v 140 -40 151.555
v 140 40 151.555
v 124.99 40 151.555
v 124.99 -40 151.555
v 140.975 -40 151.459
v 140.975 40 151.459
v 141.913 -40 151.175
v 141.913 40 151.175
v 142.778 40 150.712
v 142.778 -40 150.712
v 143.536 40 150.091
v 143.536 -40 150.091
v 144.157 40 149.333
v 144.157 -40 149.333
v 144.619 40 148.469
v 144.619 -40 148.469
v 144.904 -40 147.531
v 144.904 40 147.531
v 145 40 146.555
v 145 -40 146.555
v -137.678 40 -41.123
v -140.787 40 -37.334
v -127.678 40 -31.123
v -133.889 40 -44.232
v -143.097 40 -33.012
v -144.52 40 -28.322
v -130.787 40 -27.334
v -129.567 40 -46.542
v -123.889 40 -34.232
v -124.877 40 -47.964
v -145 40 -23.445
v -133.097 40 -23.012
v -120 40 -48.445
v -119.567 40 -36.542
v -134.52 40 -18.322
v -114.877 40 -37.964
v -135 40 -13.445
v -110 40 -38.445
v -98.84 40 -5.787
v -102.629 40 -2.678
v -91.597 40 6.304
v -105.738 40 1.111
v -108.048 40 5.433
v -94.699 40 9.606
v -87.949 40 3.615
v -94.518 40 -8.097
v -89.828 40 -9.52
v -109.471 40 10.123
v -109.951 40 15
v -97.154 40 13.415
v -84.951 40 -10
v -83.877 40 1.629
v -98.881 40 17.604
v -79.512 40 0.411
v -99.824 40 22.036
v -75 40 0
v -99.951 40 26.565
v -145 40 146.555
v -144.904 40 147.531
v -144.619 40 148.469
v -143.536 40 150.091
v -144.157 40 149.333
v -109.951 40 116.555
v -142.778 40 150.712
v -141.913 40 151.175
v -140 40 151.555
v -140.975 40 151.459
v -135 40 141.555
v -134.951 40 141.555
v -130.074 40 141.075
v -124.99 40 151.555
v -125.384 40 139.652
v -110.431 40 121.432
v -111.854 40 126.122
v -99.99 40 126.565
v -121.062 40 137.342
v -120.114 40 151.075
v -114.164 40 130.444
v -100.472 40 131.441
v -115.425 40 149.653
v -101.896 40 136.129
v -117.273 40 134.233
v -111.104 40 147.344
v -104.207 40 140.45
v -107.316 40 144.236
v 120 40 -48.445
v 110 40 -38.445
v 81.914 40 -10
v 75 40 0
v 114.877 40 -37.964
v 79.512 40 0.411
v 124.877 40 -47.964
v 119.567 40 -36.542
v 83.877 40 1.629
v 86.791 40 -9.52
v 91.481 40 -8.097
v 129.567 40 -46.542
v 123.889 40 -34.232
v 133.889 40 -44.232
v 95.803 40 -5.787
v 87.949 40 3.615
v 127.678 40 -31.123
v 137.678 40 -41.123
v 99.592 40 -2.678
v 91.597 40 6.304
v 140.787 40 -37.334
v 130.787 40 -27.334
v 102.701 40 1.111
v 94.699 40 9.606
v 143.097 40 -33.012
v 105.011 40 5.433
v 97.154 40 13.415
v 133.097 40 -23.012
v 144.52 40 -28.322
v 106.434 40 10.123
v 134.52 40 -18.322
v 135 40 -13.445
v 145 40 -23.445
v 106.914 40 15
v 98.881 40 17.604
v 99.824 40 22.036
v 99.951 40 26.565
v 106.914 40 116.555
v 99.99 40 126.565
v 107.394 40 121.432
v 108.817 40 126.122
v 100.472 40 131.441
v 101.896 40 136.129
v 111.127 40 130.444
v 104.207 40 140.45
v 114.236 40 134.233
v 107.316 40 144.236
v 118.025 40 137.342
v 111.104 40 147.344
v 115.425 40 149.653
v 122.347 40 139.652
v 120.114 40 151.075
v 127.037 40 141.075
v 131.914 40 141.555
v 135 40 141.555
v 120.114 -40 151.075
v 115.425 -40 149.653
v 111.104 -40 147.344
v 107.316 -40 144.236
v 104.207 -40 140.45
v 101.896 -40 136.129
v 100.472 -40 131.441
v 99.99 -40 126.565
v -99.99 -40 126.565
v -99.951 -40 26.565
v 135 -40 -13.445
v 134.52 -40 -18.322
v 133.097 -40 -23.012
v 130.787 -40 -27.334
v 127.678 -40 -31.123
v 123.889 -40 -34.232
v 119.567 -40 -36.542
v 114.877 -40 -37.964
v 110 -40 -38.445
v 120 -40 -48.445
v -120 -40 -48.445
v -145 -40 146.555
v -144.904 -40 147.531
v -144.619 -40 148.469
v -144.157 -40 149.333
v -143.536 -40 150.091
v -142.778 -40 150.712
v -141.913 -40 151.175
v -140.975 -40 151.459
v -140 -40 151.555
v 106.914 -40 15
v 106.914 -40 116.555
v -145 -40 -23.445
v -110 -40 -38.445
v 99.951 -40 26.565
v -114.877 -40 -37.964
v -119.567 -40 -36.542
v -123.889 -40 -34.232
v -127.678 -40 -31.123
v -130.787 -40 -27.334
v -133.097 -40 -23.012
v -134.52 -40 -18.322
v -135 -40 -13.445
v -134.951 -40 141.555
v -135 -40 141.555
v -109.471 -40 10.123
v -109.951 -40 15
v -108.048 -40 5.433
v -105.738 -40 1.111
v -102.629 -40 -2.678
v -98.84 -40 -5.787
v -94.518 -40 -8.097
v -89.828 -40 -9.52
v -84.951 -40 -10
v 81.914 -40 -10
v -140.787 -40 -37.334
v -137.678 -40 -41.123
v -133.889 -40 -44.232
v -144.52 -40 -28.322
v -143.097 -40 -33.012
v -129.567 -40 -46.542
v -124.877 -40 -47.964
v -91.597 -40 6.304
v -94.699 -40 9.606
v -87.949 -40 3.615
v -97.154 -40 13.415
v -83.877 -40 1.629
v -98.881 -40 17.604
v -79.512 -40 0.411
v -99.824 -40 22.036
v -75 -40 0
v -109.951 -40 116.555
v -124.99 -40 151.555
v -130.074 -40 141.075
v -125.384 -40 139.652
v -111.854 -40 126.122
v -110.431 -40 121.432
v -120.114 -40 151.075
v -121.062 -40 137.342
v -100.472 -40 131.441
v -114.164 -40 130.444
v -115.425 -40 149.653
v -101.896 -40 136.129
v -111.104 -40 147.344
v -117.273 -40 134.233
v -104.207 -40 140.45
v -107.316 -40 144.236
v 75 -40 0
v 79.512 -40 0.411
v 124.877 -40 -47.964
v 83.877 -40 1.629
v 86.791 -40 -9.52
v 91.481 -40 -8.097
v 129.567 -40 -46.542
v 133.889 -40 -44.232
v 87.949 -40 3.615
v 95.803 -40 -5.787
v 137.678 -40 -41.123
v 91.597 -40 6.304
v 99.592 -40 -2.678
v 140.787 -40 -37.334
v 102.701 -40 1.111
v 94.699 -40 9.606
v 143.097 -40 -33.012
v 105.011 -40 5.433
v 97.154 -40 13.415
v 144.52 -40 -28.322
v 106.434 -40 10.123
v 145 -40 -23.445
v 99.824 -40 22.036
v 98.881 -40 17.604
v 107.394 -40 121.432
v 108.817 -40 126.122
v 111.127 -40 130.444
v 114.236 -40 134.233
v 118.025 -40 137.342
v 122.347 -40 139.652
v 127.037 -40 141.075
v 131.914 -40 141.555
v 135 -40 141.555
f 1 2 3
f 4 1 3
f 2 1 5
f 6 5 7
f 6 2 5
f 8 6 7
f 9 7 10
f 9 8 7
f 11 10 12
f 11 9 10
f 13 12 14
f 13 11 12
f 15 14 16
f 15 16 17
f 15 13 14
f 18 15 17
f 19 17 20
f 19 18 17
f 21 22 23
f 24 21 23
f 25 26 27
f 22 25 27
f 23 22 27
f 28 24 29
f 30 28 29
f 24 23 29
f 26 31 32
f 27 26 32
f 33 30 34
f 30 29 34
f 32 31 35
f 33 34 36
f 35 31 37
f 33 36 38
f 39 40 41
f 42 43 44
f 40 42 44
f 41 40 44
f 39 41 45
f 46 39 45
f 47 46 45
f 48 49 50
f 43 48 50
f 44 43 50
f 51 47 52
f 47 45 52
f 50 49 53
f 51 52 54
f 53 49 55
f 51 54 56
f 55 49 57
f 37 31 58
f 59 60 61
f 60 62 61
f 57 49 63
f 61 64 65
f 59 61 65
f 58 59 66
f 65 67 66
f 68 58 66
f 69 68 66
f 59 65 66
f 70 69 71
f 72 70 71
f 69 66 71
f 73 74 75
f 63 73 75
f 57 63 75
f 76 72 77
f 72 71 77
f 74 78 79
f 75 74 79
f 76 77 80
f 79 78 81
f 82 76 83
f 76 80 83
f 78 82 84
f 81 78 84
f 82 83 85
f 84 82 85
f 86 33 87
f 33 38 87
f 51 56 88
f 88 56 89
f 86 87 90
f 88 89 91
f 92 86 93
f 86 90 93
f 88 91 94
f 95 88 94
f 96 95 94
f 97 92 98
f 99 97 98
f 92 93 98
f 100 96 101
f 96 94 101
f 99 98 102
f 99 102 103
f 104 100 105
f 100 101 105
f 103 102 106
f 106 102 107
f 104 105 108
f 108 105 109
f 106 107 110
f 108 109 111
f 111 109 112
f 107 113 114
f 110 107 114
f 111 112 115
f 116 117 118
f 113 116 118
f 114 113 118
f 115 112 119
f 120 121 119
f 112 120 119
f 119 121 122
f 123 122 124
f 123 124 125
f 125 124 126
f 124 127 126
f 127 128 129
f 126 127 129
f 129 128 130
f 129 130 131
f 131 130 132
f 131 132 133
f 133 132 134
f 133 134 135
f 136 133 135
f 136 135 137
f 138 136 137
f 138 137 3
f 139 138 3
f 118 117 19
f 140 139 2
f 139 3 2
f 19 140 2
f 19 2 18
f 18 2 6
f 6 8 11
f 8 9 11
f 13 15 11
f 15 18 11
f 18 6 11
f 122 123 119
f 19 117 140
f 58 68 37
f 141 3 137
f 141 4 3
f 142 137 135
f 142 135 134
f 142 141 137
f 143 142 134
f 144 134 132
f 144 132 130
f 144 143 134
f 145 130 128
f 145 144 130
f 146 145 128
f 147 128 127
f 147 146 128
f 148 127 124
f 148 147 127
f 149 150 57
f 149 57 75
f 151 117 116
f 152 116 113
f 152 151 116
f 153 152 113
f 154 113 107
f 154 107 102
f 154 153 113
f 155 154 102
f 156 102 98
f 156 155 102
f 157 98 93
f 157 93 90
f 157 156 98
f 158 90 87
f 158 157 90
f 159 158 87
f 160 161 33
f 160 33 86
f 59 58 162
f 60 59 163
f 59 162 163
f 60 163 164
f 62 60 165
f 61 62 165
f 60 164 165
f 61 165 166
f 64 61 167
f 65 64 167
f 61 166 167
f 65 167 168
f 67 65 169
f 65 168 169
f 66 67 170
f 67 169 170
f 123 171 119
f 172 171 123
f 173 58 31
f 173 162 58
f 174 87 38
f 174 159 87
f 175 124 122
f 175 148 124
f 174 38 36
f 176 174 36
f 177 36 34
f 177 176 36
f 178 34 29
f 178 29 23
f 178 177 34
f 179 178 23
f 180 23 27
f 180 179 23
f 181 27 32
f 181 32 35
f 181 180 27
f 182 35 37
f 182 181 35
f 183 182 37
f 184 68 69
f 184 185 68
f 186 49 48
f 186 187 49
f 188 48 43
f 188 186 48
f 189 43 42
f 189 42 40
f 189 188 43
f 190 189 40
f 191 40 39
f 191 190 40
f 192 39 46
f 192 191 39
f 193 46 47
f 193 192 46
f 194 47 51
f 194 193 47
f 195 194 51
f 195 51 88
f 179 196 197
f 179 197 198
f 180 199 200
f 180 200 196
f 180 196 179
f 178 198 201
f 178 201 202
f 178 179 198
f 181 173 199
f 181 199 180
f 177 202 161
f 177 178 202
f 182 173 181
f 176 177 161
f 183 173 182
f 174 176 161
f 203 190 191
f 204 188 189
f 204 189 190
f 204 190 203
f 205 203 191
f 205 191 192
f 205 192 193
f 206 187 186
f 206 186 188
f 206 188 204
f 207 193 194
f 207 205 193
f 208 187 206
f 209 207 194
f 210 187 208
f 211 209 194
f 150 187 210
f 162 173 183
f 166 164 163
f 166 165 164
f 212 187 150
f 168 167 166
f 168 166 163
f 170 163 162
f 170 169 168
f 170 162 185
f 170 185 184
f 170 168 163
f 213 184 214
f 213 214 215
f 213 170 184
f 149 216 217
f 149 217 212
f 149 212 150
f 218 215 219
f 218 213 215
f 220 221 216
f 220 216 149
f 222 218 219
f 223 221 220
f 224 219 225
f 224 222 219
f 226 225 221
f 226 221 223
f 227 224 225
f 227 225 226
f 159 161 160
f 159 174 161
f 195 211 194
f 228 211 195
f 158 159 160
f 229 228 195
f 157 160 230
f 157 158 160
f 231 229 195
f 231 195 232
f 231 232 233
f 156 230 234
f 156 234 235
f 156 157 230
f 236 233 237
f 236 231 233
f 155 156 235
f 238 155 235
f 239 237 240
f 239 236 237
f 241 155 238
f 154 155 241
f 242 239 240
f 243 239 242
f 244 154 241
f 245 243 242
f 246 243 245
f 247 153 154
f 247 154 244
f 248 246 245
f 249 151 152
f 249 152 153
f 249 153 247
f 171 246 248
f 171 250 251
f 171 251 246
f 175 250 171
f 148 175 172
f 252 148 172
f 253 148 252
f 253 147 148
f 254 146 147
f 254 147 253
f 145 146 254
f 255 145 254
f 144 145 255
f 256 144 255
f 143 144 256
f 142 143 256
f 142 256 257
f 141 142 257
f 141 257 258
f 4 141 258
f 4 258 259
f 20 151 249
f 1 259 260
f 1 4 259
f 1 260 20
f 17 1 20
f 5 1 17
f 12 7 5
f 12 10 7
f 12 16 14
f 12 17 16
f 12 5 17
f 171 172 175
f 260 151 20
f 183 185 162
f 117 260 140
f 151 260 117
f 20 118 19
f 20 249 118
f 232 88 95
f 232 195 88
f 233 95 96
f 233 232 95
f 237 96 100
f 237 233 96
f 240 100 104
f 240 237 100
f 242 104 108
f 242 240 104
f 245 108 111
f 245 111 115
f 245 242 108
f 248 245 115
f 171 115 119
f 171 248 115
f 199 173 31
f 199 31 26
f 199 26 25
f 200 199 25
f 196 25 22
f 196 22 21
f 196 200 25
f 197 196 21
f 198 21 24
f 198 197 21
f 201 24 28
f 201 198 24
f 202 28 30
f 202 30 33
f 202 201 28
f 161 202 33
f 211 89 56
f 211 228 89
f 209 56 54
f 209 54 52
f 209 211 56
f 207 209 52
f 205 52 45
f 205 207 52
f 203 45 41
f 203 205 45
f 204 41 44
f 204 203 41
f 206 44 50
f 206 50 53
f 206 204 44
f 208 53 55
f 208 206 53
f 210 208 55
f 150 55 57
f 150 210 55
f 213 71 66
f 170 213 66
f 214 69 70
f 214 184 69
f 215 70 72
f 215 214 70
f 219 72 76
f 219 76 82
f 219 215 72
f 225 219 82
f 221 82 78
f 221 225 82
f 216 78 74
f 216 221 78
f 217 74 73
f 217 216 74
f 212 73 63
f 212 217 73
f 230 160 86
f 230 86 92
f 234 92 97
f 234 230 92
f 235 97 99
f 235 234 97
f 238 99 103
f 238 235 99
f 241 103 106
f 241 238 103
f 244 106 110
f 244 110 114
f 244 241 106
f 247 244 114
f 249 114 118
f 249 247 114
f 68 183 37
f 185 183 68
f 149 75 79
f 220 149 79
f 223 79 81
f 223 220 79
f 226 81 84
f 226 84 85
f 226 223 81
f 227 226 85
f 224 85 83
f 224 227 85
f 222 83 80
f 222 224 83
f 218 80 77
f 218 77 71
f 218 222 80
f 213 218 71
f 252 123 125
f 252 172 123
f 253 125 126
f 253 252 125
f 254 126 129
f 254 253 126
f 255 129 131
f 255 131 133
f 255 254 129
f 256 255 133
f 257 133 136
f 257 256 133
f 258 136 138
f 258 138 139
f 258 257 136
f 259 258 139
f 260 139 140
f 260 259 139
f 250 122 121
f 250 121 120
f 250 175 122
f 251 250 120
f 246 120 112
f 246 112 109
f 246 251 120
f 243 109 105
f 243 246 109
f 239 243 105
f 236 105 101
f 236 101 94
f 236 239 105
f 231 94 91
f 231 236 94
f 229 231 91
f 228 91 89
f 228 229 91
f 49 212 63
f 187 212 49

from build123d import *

# Parameters (mm, degrees)
F1_DEPTH = 40
F2_R     = 5


with BuildPart() as f1:
    # F0 (on Front) → F1 (new body, symmetric)
    with BuildSketch(Plane.XZ):
        with BuildLine():
            Line((0, 0), (-75, 0))
            ThreePointArc((-75, 0), (-93.22257, 7.88457), (-99.95097, 26.564963))
            Line((-99.95097, 26.564963), (-99.990197, 126.564956))
            ThreePointArc((-99.990197, 126.564956), (-107.315993, 144.236285), (-124.990195, 151.555149))
            Line((-124.990195, 151.555149), (-145, 151.555149))
            Line((-145, 151.555149), (-145, -23.444851))
            ThreePointArc((-145, -23.444851), (-137.67767, -41.122521), (-120, -48.444851))
            Line((-120, -48.444851), (120, -48.444851))
            ThreePointArc((120, -48.444851), (137.67767, -41.122521), (145, -23.444851))
            Line((145, -23.444851), (145, 151.555149))
            Line((145, 151.555149), (124.990195, 151.555149))
            ThreePointArc((124.990195, 151.555149), (107.315993, 144.236285), (99.990197, 126.564956))
            Line((99.990197, 126.564956), (99.95097, 26.564963))
            ThreePointArc((99.95097, 26.564963), (93.22257, 7.88457), (75, 0))
            Line((75, 0), (0, 0))
        make_face()
        with BuildLine():
            Line((-84.95097, -10), (0, -10))
            Line((0, -10), (81.913937, -10))
            ThreePointArc((81.913937, -10), (99.591607, -2.67767), (106.913937, 15))
            Line((106.913937, 15), (106.913937, 116.555149))
            ThreePointArc((106.913937, 116.555149), (114.236268, 134.232818), (131.913937, 141.555149))
            Line((131.913937, 141.555149), (135, 141.555149))
            Line((135, 141.555149), (135, -13.444851))
            ThreePointArc((135, -13.444851), (127.67767, -31.122521), (110, -38.444851))
            Line((110, -38.444851), (-110, -38.444851))
            ThreePointArc((-110, -38.444851), (-127.67767, -31.122521), (-135, -13.444851))
            Line((-135, -13.444851), (-135, 141.555149))
            Line((-135, 141.555149), (-134.95097, 141.555149))
            ThreePointArc((-134.95097, 141.555149), (-117.2733, 134.232818), (-109.95097, 116.555149))
            Line((-109.95097, 116.555149), (-109.95097, 15))
            ThreePointArc((-109.95097, 15), (-102.628639, -2.67767), (-84.95097, -10))
        make_face(mode=Mode.SUBTRACT)
    extrude(amount=F1_DEPTH, both=True)

    # F2
    f2_edges = [f1.edges().sort_by_distance(p)[0] for p in [
        (-145, 0, 151.555149),
        (145, 0, 151.555149),
    ]]
    fillet(f2_edges, radius=F2_R)


solid = f1.part
